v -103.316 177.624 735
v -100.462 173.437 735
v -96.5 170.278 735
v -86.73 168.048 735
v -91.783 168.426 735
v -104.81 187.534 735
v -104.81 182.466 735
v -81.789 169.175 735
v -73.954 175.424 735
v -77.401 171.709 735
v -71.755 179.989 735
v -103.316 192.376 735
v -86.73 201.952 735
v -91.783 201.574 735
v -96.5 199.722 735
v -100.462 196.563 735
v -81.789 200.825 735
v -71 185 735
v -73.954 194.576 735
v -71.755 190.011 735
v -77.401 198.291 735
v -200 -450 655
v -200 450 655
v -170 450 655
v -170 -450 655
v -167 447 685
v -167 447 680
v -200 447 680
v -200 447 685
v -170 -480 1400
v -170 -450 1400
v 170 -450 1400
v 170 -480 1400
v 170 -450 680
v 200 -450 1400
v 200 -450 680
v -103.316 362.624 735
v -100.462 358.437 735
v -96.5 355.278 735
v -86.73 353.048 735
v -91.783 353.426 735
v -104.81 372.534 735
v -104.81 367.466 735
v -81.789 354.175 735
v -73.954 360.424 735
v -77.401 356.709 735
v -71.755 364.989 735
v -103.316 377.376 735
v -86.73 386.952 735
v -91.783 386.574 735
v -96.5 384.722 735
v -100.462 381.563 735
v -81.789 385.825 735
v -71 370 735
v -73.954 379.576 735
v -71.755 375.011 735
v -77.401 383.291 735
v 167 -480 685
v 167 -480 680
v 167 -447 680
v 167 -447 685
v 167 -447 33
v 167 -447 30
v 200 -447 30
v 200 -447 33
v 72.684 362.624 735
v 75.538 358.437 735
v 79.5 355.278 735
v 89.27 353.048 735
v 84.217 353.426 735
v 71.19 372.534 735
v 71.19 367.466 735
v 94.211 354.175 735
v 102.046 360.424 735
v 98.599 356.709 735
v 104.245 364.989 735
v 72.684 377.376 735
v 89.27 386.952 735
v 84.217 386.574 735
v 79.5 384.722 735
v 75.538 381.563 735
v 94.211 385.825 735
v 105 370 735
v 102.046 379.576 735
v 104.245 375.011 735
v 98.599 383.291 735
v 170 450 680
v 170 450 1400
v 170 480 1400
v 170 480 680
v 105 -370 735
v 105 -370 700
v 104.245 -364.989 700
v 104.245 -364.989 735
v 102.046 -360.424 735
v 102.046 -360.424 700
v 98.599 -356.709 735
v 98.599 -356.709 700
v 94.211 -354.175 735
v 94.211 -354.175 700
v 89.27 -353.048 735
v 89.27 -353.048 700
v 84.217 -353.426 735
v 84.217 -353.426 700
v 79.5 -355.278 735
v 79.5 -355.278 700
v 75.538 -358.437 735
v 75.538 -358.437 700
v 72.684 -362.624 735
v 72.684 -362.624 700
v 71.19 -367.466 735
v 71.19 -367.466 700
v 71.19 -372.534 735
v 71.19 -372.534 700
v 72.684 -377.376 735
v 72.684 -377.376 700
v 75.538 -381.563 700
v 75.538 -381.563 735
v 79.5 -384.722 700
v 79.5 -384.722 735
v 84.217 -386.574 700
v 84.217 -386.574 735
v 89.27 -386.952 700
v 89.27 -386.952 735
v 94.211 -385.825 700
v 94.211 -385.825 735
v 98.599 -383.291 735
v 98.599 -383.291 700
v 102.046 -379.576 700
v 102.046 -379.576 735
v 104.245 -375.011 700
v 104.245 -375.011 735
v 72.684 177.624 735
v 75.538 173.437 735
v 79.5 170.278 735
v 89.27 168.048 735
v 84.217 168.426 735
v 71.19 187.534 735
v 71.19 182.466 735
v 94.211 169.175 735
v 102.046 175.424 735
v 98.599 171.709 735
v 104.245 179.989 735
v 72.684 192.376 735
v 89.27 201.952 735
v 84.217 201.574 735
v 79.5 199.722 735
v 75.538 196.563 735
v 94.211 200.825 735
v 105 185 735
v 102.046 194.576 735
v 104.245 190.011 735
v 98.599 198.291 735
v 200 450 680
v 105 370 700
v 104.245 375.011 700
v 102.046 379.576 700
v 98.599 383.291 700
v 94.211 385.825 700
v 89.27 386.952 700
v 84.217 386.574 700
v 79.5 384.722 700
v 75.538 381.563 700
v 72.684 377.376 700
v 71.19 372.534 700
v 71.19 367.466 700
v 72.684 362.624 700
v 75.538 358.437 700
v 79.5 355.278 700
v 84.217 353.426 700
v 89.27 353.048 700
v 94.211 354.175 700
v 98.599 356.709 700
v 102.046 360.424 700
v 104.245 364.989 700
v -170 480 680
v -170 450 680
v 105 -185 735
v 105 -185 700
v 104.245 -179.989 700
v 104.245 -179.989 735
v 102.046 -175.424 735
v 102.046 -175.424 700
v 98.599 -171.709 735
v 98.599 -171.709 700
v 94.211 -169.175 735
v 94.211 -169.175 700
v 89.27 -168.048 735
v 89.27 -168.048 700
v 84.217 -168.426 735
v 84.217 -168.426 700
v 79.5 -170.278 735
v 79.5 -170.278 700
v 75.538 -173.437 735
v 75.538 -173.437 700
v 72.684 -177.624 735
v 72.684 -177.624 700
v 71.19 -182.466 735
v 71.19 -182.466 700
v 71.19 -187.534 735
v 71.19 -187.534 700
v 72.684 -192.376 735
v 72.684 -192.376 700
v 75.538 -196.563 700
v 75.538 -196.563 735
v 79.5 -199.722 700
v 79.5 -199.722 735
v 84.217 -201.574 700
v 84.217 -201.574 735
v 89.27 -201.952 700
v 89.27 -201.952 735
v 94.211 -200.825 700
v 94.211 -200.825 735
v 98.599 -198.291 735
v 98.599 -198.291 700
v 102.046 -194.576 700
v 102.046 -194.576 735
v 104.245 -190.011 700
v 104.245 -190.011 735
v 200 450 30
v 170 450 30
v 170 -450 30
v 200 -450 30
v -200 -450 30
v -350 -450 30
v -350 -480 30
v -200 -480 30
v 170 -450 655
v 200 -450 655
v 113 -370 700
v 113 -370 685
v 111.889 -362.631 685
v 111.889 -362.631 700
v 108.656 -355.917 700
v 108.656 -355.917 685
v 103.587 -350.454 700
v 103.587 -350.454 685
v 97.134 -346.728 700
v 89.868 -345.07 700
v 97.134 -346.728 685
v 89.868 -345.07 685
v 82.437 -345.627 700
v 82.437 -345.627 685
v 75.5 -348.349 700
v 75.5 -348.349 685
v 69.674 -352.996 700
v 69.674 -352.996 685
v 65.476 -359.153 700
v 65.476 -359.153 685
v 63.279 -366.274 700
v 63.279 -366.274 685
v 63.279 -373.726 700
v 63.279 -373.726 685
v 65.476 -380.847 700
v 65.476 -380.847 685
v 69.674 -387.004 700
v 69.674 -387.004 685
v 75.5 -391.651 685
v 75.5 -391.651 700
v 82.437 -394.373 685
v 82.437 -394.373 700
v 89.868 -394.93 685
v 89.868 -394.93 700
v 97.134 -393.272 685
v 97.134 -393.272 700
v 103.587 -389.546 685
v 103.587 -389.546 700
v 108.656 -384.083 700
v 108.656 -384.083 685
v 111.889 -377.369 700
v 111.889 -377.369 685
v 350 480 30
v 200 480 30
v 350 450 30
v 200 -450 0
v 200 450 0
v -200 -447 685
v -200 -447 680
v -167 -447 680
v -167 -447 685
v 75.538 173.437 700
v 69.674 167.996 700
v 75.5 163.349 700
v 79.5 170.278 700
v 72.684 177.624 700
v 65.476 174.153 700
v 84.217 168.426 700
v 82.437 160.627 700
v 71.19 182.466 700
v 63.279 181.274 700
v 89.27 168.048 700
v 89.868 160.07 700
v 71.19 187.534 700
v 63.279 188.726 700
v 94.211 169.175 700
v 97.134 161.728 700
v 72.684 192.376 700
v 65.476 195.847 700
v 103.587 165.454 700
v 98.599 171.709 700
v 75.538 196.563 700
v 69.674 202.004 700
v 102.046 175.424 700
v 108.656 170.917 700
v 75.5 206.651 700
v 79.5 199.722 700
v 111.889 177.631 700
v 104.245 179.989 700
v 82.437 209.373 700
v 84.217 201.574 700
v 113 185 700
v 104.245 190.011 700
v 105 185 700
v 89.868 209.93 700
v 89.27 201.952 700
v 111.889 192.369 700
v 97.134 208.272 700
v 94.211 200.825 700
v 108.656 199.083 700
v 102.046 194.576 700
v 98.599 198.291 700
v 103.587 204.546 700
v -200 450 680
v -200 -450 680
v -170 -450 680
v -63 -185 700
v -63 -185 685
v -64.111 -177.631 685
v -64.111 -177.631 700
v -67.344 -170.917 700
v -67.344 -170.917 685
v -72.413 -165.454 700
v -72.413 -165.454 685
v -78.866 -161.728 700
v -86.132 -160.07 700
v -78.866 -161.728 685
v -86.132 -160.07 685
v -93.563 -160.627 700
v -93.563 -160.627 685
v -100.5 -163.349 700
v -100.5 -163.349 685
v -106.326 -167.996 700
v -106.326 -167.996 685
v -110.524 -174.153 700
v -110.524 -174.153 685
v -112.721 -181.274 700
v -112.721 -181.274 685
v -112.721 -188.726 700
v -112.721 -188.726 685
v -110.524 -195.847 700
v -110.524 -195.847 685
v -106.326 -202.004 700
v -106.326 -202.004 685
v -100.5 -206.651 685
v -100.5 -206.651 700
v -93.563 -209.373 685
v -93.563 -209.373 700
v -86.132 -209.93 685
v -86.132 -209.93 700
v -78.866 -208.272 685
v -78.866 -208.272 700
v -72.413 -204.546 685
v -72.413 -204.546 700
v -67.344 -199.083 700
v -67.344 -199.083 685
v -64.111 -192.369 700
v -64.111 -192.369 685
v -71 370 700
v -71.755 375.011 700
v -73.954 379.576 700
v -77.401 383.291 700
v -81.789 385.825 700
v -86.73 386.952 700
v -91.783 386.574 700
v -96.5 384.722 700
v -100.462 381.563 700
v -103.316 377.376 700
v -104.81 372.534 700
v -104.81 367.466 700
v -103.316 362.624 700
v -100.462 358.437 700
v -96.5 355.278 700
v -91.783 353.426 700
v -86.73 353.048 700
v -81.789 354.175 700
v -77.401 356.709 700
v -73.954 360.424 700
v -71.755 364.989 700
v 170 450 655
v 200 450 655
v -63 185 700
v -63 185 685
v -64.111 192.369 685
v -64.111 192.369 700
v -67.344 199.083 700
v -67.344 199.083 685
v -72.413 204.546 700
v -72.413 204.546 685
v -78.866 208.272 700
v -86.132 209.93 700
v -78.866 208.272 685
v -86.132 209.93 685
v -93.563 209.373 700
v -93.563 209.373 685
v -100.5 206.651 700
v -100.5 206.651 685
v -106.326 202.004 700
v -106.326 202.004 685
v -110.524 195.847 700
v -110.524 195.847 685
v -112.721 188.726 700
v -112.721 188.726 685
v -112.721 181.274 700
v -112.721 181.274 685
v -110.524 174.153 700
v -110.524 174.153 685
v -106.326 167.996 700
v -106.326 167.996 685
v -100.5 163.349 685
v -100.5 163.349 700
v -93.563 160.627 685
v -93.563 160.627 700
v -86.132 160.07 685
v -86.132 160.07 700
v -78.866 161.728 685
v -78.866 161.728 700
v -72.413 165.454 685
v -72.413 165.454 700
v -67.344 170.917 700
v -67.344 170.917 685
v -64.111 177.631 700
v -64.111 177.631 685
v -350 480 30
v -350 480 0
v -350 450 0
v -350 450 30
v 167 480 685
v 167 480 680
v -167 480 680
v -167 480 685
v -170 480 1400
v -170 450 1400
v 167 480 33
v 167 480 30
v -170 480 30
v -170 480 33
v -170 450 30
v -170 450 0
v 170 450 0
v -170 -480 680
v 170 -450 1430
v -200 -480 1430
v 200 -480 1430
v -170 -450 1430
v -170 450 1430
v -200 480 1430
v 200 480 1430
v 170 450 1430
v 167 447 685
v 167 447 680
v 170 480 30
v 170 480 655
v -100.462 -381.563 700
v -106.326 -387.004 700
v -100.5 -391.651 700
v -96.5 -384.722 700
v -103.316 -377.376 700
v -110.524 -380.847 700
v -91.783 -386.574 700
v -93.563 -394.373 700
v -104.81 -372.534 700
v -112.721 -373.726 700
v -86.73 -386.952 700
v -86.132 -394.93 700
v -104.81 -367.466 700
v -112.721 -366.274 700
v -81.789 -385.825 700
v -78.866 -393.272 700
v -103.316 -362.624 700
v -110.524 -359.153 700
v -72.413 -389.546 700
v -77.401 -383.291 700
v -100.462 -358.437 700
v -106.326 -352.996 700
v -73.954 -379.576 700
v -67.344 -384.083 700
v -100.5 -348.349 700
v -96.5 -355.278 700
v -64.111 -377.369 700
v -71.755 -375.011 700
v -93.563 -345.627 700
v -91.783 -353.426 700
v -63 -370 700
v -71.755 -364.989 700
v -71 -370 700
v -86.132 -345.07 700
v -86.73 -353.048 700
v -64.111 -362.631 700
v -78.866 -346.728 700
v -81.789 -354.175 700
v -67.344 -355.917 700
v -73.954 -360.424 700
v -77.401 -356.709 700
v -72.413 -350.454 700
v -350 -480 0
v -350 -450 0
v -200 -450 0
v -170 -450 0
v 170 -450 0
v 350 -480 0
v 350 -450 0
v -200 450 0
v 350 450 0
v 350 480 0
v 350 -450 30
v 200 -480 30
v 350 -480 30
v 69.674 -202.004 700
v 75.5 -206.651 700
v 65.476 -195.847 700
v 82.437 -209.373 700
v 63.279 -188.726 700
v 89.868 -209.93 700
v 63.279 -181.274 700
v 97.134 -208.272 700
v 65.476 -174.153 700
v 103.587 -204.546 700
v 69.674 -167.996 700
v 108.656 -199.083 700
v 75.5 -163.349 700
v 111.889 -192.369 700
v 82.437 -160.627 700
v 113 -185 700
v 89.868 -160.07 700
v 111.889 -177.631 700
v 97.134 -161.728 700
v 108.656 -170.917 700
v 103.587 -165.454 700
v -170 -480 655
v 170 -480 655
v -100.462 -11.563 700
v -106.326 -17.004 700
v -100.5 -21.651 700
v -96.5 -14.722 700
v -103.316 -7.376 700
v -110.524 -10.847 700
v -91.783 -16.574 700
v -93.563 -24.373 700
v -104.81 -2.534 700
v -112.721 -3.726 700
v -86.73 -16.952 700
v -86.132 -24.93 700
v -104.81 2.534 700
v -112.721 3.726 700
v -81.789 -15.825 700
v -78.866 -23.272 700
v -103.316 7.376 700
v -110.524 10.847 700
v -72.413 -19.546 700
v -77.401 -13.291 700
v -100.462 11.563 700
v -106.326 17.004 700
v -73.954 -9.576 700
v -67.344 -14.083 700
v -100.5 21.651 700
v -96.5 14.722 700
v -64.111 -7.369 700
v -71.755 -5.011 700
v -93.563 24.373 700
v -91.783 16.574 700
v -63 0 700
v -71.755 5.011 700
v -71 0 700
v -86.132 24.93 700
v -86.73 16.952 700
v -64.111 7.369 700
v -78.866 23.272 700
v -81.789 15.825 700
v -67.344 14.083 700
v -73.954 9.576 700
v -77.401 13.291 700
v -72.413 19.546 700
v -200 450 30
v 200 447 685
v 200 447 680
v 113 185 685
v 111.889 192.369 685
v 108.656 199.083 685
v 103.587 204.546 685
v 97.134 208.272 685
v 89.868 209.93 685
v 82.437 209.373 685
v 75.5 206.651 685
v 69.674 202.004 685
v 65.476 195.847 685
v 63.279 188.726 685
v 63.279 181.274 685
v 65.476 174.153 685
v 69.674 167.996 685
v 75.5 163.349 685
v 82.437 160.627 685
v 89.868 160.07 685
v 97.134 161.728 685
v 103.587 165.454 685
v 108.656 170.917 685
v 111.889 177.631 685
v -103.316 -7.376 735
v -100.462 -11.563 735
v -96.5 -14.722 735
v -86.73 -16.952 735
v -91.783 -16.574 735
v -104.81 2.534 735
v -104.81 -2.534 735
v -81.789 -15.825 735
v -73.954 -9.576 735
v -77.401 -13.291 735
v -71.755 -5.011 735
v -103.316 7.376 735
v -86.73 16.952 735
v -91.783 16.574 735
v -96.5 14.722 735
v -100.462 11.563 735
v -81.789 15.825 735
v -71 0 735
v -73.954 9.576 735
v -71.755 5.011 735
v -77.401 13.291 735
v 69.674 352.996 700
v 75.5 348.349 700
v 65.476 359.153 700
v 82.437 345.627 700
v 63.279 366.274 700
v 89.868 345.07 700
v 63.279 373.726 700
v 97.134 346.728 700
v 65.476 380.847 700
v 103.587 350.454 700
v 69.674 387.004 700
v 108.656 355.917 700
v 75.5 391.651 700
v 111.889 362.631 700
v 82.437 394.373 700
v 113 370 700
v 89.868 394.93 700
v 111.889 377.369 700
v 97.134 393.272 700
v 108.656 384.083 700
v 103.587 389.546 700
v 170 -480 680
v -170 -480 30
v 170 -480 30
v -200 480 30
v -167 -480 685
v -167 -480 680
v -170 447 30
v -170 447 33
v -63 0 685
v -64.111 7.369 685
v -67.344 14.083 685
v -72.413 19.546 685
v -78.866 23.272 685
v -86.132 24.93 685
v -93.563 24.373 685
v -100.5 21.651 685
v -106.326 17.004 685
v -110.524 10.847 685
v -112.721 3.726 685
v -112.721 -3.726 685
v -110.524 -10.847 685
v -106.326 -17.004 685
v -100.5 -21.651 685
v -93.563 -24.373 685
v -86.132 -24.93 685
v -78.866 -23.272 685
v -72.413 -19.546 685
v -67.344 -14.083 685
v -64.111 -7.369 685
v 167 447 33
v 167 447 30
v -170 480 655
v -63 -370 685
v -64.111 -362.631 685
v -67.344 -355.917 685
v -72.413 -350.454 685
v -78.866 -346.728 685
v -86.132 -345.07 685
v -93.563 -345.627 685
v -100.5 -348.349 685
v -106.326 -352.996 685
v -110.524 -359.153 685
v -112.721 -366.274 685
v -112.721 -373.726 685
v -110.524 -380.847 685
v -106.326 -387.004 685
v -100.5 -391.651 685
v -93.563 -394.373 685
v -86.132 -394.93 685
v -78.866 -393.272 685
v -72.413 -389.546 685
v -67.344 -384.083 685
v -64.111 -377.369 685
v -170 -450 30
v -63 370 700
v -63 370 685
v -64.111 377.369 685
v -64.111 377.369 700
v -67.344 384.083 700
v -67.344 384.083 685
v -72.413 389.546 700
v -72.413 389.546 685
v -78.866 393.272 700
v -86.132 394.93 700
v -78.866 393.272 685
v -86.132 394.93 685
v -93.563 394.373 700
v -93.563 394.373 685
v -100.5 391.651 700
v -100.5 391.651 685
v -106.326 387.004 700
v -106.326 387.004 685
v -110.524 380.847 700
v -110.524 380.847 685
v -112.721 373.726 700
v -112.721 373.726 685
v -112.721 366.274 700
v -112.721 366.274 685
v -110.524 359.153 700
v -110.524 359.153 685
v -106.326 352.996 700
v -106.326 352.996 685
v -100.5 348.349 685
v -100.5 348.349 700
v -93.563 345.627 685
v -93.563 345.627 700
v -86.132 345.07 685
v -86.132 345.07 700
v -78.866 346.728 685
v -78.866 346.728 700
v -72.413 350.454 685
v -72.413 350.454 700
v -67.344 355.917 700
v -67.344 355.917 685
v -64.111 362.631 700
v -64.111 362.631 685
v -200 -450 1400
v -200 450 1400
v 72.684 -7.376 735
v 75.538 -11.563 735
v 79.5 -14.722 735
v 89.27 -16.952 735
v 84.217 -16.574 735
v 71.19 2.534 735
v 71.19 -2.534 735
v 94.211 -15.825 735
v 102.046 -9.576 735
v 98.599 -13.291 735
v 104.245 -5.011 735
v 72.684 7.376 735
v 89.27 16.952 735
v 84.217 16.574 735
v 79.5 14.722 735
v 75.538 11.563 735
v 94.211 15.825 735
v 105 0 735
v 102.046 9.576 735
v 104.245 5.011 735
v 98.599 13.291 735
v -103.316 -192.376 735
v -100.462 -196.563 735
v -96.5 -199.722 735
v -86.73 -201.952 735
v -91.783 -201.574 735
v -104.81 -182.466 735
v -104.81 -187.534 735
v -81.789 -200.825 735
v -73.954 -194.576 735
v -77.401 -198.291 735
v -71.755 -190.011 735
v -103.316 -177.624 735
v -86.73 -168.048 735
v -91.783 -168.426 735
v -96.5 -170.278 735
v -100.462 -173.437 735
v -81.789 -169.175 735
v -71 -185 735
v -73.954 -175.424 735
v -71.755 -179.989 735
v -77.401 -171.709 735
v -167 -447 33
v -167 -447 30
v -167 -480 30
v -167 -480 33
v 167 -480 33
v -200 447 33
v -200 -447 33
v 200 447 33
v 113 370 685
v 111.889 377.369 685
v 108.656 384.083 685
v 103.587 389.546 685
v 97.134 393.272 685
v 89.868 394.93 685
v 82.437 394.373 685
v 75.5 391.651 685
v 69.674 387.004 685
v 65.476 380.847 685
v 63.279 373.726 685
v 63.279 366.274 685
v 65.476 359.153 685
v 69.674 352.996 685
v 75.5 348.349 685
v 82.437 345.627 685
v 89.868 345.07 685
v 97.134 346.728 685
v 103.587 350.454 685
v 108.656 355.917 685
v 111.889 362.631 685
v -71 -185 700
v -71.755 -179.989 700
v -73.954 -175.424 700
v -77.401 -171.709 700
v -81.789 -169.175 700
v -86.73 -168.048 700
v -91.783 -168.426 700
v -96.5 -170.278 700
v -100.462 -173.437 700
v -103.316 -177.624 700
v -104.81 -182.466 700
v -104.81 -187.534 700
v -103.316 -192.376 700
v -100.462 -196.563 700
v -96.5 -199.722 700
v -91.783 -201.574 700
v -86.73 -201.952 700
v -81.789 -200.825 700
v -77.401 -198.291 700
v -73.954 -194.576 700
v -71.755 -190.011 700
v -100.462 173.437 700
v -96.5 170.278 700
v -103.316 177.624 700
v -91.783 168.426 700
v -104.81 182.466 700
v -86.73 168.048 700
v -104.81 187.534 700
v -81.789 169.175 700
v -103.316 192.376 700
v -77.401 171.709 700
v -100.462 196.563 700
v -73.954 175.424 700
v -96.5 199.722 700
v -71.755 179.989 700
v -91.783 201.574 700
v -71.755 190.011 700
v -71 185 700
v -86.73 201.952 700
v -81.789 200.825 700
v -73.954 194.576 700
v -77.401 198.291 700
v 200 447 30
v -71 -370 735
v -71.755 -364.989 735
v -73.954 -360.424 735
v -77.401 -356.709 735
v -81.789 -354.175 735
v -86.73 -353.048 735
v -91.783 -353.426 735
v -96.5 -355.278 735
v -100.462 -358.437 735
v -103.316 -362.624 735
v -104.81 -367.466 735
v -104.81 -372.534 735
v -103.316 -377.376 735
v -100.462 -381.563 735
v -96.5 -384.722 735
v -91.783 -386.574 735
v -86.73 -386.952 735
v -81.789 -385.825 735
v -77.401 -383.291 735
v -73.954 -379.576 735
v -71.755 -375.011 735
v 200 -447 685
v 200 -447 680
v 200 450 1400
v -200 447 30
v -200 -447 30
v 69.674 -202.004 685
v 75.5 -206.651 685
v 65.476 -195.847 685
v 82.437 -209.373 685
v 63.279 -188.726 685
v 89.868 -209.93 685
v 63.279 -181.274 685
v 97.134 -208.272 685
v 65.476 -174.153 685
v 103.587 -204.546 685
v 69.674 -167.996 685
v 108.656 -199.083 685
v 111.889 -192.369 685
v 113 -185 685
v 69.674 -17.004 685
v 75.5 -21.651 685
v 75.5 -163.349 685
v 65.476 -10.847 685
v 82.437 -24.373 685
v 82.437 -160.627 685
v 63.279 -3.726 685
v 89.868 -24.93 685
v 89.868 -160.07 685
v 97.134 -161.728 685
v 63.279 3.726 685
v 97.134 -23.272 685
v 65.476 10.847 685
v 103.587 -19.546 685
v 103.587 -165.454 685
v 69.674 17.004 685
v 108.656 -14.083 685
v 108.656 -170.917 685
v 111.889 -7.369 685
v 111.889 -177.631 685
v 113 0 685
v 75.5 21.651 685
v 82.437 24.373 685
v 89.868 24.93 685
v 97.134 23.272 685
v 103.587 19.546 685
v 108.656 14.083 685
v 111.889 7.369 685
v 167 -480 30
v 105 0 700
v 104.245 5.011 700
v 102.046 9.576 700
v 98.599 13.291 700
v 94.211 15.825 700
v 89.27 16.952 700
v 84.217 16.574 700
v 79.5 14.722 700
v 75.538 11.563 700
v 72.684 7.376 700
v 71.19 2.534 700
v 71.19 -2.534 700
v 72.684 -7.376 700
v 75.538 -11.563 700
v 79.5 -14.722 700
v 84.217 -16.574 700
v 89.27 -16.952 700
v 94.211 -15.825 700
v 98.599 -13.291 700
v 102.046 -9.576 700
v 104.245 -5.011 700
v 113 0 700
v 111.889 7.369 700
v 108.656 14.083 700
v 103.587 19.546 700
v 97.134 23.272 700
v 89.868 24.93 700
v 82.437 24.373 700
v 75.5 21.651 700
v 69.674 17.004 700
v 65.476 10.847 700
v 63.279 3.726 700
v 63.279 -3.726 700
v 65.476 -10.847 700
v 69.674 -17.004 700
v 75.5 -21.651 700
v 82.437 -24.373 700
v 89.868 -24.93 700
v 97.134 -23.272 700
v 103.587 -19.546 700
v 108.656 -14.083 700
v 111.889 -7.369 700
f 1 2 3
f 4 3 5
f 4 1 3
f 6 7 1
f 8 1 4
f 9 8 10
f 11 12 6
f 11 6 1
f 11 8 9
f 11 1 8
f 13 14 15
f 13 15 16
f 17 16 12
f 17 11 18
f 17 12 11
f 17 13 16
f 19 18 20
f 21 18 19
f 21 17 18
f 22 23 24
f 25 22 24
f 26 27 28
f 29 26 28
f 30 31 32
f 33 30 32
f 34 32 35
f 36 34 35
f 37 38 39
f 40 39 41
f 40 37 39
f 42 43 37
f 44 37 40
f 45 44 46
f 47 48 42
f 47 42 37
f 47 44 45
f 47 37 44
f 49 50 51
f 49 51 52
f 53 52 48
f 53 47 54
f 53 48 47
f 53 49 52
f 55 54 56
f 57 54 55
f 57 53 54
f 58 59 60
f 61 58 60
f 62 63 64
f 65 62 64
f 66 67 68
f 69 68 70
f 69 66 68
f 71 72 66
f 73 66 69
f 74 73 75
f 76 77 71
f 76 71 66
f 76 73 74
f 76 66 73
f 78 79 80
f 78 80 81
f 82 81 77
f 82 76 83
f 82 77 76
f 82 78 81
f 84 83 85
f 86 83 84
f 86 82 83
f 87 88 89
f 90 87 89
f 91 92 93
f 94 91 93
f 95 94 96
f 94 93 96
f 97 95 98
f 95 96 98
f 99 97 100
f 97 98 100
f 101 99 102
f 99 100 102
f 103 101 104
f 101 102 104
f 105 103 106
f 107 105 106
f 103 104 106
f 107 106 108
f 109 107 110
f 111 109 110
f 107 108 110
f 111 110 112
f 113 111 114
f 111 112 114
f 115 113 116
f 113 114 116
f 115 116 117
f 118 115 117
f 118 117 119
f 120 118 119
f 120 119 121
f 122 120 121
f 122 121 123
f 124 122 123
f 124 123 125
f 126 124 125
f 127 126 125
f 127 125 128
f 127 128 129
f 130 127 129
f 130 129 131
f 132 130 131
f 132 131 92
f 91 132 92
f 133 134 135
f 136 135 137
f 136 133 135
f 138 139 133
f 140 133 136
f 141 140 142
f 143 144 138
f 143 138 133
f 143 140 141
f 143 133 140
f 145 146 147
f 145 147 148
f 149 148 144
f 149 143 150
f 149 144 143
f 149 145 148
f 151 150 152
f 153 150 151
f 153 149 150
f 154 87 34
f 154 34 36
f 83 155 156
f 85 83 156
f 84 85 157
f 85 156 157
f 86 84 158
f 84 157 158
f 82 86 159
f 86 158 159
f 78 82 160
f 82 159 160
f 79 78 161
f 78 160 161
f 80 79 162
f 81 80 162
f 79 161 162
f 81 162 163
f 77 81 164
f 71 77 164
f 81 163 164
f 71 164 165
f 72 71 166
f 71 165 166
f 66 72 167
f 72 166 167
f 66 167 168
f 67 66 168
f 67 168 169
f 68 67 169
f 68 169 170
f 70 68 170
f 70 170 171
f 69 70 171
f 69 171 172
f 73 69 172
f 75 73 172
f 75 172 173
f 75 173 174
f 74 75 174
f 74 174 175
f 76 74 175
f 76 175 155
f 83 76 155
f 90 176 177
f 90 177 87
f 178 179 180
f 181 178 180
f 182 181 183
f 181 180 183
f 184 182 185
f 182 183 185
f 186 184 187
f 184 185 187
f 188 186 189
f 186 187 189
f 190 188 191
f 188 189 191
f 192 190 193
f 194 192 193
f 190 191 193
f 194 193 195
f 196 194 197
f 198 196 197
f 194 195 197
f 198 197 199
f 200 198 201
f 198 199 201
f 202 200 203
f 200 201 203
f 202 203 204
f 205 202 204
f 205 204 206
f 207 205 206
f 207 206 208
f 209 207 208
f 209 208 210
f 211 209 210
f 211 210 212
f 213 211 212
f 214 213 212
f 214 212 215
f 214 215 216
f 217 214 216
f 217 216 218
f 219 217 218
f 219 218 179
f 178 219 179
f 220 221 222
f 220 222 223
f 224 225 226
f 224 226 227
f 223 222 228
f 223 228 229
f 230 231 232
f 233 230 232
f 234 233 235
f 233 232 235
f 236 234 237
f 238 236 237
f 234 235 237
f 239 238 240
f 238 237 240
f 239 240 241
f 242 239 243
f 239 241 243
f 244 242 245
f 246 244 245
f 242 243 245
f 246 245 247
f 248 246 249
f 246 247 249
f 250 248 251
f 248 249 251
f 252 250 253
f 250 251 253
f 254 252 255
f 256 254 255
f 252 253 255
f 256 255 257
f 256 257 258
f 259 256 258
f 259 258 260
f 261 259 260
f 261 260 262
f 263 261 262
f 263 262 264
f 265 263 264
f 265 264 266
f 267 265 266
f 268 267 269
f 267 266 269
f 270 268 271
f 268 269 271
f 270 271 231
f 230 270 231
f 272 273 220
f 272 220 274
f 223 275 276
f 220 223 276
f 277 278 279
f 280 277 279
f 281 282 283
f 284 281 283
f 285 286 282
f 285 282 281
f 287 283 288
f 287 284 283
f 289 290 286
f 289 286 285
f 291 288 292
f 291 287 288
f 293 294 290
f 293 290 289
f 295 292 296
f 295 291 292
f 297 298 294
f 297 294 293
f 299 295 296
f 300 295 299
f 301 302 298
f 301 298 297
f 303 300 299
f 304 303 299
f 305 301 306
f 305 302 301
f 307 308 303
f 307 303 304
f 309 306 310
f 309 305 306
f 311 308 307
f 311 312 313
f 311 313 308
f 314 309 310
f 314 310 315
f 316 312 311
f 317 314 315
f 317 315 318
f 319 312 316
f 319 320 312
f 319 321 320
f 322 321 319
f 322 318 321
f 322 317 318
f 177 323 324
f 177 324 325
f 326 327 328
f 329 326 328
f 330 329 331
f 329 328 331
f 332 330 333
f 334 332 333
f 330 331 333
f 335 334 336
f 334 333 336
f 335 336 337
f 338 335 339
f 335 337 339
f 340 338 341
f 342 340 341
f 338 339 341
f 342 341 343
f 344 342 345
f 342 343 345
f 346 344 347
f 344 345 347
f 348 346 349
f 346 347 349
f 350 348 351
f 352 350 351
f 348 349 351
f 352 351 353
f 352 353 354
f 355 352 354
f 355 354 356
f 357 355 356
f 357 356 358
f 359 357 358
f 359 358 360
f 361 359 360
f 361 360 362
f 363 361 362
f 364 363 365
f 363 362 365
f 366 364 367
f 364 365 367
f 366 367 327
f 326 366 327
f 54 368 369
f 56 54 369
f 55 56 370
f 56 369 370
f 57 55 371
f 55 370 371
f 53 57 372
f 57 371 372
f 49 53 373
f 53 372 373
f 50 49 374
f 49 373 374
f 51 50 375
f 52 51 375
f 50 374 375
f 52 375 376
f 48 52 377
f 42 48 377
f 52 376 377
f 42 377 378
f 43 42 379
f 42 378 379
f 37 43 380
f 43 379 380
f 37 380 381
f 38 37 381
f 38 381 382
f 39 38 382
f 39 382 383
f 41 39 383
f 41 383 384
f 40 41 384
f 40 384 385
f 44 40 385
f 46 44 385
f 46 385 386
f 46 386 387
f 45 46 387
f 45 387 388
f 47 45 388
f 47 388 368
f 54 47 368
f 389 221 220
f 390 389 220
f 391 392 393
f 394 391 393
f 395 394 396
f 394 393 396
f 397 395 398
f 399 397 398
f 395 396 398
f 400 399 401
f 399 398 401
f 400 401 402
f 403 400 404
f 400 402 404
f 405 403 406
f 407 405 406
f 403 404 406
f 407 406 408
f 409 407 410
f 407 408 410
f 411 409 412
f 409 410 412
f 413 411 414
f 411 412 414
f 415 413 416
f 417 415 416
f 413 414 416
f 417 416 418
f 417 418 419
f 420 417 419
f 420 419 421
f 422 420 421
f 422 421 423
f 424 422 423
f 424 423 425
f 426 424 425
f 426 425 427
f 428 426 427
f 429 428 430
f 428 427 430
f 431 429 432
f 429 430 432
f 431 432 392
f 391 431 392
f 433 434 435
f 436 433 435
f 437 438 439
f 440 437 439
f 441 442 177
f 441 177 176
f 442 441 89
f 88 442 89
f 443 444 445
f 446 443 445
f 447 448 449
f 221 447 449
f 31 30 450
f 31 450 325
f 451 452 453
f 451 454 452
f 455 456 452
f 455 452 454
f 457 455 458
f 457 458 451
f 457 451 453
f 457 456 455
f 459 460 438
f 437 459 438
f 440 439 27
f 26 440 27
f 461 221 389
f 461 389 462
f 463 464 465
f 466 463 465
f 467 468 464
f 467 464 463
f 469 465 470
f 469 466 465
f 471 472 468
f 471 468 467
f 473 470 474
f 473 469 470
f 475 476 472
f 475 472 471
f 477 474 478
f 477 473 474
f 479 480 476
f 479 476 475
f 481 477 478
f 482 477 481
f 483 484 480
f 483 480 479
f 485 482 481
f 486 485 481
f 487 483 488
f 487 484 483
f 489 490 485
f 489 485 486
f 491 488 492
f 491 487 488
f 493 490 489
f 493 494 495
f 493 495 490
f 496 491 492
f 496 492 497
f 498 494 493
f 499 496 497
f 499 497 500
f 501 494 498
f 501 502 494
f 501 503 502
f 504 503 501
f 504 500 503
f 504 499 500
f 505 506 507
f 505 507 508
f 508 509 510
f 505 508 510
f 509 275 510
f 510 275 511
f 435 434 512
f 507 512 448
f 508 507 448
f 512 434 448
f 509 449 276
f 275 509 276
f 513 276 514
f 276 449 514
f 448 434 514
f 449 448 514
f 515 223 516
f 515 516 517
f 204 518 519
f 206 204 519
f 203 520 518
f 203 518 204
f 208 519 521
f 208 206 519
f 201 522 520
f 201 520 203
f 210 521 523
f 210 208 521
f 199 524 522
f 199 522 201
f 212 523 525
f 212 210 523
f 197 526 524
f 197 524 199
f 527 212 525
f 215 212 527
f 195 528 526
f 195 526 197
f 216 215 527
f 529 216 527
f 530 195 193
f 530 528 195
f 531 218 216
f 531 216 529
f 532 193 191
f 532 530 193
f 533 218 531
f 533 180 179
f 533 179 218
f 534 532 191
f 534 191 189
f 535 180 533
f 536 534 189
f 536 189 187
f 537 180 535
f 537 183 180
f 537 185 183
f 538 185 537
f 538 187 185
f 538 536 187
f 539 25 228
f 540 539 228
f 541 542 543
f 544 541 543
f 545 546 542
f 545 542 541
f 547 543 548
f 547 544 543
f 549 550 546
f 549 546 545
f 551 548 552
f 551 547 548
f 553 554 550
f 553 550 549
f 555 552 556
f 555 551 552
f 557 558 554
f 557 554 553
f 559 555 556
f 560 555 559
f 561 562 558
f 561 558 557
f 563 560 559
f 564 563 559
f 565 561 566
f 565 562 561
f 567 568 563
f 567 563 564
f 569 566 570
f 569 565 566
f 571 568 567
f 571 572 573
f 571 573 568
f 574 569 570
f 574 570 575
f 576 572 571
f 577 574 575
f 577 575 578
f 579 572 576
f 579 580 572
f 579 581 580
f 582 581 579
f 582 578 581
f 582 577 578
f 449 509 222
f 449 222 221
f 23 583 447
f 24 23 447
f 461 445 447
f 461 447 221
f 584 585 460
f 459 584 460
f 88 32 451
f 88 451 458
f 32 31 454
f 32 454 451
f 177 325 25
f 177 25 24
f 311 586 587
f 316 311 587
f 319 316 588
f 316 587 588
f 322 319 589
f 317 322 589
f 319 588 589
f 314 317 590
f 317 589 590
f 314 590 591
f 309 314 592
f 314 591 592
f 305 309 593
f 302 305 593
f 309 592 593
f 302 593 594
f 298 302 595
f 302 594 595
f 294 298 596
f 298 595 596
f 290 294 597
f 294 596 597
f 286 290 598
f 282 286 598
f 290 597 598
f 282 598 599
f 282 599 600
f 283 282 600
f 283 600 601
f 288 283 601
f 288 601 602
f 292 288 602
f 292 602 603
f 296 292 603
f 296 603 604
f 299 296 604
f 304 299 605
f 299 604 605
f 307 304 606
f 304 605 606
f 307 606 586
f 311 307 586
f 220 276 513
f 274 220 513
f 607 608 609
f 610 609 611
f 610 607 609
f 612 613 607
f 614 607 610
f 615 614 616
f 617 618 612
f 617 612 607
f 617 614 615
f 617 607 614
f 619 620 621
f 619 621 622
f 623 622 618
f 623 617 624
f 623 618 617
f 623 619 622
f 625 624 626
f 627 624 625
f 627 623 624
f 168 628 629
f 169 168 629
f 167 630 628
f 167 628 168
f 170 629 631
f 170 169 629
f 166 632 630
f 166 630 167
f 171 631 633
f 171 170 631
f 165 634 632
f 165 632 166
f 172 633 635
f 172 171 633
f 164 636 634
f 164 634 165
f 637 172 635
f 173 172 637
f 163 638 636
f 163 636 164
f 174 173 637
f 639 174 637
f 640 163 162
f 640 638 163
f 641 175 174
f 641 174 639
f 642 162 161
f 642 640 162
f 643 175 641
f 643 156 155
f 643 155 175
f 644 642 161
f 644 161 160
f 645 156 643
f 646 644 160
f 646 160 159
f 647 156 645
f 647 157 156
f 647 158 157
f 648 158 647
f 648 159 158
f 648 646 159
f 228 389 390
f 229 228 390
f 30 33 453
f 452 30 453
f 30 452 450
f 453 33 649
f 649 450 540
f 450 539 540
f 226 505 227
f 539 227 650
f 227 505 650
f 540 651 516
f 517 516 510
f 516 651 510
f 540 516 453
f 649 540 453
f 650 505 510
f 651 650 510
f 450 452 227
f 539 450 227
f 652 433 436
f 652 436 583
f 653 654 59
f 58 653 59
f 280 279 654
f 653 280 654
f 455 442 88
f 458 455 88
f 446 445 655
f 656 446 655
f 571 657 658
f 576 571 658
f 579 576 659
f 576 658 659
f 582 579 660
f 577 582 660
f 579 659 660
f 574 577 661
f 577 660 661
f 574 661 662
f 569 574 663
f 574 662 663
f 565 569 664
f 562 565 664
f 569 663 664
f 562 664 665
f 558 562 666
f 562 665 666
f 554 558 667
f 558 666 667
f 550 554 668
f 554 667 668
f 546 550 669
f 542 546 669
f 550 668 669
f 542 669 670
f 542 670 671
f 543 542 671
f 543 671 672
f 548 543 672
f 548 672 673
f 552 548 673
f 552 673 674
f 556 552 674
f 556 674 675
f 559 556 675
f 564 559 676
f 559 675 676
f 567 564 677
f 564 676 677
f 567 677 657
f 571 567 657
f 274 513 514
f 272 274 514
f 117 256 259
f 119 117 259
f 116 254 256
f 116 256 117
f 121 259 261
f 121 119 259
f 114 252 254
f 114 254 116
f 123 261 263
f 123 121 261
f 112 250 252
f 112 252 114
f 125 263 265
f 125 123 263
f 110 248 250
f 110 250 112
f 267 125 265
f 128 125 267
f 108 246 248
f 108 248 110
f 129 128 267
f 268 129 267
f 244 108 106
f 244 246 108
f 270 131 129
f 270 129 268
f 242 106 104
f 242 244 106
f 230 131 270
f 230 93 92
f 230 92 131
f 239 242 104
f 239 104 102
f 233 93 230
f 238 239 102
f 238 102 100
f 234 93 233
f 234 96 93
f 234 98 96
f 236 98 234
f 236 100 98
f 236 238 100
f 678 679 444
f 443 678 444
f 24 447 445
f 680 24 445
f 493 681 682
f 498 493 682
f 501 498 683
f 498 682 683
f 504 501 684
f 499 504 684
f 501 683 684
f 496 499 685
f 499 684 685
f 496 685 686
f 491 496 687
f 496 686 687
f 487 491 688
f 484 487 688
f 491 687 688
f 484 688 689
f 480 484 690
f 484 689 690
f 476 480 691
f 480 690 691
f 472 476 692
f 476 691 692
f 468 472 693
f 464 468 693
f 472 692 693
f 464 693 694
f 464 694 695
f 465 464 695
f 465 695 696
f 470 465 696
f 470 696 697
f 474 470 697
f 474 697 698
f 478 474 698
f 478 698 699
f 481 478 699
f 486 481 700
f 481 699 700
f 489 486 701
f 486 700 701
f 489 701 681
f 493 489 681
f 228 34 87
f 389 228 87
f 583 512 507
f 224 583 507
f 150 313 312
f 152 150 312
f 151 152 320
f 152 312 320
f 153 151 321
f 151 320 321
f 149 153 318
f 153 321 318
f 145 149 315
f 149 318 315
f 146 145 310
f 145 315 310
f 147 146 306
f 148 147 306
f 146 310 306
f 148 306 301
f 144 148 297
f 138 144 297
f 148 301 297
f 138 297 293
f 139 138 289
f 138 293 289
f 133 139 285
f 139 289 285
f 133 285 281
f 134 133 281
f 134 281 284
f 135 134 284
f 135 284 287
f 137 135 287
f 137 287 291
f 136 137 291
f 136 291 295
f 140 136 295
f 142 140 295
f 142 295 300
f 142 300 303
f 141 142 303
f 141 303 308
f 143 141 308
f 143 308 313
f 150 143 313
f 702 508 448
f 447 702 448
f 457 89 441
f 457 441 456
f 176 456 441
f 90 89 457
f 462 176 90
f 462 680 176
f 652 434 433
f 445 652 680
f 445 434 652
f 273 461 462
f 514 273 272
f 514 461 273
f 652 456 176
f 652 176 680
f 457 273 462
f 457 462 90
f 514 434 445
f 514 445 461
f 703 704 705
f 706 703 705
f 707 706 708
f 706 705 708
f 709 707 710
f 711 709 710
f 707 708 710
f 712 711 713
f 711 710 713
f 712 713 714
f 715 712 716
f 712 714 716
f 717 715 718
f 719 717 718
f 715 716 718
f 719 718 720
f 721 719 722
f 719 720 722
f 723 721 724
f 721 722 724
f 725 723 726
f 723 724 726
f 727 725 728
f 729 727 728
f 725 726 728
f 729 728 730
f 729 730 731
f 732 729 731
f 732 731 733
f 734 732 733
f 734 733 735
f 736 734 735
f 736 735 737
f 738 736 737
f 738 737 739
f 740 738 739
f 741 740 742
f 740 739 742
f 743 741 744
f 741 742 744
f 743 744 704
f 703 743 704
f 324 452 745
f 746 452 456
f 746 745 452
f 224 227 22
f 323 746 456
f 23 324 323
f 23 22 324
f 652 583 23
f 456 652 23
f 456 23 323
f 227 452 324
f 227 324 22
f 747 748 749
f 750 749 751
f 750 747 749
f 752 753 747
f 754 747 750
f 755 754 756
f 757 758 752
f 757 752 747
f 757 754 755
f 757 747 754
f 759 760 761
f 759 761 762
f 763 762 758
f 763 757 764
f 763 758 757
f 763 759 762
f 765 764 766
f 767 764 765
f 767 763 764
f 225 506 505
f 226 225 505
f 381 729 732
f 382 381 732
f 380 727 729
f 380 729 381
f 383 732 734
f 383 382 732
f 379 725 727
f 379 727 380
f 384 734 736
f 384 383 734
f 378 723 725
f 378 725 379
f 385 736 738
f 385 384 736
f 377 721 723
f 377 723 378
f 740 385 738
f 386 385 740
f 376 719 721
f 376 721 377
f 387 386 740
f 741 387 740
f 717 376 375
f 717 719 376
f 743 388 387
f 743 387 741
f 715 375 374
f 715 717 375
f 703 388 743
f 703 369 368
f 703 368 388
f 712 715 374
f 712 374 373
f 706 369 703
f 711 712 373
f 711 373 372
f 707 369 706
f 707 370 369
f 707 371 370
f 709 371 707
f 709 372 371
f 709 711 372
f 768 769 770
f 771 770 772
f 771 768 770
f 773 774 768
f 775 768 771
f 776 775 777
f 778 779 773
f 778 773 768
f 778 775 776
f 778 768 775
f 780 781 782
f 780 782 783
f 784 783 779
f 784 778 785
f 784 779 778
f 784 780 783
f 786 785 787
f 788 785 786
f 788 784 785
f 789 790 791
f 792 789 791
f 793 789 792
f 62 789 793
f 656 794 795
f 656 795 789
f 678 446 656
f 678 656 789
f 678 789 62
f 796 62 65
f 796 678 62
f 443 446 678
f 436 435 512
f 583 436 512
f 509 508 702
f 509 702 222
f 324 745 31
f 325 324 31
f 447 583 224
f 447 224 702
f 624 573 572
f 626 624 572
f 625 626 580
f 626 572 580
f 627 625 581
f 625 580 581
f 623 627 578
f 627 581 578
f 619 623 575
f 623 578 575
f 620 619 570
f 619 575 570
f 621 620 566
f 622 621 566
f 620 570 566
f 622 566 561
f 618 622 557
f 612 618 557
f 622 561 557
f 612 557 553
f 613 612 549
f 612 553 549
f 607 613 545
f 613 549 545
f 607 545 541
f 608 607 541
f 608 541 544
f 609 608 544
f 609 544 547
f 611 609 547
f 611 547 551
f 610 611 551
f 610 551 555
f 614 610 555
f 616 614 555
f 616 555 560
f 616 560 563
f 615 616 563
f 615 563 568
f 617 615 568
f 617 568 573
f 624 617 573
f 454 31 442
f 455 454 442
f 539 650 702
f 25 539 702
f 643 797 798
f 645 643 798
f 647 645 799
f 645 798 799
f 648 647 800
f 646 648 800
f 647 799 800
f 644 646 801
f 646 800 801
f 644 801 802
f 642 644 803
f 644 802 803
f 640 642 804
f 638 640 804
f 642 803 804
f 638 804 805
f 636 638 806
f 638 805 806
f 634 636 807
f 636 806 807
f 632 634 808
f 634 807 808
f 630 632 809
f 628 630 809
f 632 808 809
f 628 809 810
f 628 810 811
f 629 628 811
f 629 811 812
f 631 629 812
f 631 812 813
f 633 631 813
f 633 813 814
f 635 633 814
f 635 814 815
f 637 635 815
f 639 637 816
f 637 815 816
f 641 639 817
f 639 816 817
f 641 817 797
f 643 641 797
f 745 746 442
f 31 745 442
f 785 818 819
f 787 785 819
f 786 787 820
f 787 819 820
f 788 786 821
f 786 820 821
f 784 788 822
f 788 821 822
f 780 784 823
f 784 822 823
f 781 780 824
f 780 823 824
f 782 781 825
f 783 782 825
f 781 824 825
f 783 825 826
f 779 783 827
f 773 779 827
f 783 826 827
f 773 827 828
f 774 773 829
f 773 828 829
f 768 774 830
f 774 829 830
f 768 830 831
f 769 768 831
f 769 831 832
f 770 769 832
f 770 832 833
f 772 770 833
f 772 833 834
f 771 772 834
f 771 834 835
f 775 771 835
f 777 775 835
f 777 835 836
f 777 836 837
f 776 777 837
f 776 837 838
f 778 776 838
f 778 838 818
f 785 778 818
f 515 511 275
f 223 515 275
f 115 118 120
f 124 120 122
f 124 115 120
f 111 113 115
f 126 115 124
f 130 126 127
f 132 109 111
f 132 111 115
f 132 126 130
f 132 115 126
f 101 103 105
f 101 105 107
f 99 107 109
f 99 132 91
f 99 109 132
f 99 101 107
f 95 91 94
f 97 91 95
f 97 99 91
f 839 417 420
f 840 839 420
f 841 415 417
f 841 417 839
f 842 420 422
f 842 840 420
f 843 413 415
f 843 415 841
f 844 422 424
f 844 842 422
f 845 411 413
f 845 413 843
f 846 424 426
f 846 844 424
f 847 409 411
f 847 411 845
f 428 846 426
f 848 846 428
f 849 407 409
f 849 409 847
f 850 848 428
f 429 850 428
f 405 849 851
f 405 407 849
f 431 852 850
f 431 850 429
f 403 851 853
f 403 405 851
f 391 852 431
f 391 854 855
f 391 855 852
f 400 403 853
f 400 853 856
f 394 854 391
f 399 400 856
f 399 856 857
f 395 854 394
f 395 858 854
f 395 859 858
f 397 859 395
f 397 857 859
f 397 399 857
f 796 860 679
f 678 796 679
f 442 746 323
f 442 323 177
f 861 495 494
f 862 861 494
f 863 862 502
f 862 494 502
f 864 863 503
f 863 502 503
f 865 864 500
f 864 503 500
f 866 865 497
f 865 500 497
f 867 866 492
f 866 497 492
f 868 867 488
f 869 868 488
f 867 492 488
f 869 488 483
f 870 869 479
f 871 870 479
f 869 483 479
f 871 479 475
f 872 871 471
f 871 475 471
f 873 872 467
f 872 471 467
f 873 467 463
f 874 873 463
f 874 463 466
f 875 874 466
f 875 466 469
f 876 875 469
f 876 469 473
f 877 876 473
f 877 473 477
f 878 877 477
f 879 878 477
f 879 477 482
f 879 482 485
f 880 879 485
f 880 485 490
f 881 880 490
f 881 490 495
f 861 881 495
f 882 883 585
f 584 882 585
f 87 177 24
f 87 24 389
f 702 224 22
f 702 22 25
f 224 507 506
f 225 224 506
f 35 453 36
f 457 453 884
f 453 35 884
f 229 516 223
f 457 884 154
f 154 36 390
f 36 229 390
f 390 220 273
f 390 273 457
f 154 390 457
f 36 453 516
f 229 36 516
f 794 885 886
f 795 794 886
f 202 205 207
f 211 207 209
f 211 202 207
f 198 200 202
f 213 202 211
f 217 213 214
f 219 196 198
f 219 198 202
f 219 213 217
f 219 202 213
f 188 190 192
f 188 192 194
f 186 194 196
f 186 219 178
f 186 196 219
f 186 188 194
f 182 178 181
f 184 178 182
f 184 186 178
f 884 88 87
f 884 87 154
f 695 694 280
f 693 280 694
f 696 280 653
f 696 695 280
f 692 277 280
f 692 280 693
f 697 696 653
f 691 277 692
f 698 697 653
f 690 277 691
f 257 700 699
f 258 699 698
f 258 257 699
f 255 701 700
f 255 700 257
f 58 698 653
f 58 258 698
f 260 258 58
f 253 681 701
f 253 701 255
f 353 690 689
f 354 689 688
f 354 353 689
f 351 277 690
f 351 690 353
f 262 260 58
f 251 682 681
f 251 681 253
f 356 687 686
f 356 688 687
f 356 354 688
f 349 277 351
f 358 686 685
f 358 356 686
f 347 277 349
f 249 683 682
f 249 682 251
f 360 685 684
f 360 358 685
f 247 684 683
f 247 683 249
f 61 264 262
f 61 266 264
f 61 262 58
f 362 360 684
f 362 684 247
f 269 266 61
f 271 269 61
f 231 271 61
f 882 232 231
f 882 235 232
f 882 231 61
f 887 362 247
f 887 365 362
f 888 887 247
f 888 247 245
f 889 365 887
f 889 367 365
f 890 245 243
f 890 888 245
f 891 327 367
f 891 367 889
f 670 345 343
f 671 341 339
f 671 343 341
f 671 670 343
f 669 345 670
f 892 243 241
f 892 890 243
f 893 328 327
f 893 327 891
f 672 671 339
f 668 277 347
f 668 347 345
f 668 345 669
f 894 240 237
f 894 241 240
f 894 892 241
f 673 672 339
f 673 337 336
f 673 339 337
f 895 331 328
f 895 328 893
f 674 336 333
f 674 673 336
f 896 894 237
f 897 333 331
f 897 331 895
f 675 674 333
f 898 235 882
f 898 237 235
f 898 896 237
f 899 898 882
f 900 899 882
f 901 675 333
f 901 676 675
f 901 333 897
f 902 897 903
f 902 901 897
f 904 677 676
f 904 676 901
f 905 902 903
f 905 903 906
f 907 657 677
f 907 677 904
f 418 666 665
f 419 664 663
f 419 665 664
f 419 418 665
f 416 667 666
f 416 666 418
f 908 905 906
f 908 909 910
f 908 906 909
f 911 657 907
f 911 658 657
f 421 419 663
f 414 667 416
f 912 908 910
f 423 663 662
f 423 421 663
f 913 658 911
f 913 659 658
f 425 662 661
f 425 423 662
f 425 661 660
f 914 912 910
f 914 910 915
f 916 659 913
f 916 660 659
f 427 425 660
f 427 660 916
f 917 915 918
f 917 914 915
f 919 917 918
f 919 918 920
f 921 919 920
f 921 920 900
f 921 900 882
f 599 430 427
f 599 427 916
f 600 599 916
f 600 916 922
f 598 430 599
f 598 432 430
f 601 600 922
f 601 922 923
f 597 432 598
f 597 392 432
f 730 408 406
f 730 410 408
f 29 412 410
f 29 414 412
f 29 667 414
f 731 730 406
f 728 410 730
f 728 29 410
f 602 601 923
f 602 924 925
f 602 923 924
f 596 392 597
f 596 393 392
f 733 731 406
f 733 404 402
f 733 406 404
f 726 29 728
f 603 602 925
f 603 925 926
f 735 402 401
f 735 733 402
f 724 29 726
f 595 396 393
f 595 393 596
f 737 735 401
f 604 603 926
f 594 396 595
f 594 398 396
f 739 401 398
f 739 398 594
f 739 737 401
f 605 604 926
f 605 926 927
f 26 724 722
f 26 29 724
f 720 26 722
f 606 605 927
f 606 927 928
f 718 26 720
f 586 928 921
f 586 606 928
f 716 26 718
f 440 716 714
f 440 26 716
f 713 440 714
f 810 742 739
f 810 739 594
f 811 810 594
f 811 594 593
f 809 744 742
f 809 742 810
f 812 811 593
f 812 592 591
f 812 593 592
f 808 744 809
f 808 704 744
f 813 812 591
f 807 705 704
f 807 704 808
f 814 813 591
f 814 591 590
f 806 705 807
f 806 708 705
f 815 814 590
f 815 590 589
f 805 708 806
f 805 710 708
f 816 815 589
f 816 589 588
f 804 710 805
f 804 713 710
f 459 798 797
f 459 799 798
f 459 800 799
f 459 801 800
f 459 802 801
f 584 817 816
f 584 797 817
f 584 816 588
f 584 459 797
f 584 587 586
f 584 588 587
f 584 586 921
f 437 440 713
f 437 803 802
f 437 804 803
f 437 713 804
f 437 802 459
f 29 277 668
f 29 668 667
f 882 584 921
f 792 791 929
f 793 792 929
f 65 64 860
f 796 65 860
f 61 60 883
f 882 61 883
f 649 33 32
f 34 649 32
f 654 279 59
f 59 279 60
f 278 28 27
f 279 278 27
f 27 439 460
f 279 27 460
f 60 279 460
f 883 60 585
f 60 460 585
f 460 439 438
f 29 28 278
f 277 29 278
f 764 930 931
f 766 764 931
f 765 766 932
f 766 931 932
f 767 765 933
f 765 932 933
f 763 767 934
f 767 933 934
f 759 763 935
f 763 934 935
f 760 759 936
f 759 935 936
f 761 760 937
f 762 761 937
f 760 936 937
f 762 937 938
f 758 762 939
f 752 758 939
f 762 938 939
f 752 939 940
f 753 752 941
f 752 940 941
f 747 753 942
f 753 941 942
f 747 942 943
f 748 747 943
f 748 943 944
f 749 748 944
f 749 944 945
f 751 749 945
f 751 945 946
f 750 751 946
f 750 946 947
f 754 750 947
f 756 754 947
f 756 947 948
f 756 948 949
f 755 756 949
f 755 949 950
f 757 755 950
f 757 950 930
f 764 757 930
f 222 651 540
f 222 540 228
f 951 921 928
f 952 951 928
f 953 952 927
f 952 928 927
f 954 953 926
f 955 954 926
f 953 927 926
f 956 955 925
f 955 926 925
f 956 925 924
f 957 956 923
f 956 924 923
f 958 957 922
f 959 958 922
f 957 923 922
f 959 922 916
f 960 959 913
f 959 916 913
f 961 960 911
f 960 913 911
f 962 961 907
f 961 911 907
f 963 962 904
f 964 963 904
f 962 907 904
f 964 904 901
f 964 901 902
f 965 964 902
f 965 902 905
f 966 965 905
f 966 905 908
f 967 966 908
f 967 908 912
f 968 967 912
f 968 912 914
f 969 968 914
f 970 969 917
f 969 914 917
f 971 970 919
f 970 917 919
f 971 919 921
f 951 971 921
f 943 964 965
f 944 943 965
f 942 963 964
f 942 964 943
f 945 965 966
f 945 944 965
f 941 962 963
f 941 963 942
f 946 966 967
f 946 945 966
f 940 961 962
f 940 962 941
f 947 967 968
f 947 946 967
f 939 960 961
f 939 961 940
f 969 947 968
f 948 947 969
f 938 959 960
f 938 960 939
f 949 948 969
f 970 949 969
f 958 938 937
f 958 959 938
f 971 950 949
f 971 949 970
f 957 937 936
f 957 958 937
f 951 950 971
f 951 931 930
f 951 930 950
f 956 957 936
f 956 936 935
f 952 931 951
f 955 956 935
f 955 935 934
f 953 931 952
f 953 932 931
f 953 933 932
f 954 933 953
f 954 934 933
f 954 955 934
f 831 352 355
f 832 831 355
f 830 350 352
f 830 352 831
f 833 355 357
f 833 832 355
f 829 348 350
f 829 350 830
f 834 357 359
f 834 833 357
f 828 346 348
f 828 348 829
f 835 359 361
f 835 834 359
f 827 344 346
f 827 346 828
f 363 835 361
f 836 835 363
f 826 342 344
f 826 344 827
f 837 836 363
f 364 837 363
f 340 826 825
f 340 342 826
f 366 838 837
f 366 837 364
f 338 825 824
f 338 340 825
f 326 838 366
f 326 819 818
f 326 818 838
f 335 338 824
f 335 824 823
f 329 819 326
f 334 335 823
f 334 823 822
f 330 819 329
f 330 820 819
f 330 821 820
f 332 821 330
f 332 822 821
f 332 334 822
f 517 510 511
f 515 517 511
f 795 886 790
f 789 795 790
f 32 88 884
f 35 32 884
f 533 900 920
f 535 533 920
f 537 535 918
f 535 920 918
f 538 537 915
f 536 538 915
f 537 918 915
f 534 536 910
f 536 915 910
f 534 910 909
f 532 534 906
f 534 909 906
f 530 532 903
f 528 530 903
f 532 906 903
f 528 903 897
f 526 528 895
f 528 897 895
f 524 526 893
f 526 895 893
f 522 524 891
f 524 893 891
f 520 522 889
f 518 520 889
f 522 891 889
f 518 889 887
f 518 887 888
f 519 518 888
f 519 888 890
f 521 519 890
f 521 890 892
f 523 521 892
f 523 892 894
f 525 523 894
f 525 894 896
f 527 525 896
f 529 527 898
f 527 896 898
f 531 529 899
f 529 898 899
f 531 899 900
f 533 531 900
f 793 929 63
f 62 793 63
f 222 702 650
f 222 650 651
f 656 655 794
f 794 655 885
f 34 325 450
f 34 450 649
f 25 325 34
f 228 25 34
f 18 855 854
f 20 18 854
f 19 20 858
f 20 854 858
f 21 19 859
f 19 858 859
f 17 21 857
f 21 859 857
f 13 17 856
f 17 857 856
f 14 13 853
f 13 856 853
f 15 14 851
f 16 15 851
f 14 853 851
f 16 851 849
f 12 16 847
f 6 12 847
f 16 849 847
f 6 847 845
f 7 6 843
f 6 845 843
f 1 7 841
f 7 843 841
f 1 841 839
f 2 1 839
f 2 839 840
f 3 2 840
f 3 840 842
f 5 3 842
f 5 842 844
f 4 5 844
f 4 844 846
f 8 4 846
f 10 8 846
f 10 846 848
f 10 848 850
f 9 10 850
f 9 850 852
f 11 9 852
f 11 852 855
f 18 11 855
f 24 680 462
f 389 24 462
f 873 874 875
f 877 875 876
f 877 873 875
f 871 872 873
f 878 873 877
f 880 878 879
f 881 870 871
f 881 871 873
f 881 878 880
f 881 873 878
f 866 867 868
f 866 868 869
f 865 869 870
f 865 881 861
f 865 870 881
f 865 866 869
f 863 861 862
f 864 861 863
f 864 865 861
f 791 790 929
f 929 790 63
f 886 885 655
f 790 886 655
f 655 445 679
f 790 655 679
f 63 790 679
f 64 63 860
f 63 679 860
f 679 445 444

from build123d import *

# Parameters (mm, degrees)
F0_W      = 30
F0_H      = 30
F1_DEPTH  = 1400
F2_W      = 340
F2_H      = 900
F3_DEPTH  = 30
F5_W      = 400
F5_H      = 960
F5_W_2    = 340
F5_H_2    = 900
F6_DEPTH  = 25
F8_W      = 400
F8_H      = 960
F8_W_2    = 340
F8_H_2    = 900
F9_DEPTH  = 30
F11_DEPTH = 5
F12_R     = 17
F13_DEPTH = 50
F14_R     = 25
F14_R_2   = 17
F15_DEPTH = 15
F17_DEPTH = 3


with BuildPart() as f1:
    # F0 (on Top) → F1 (new body)
    with BuildSketch(Plane.XY):
        with Locations((185, 465)):
            Rectangle(F0_W, F0_H)
        with Locations((185, -465)):
            Rectangle(F0_W, F0_H)
        with Locations((-185, 465)):
            Rectangle(F0_W, F0_H)
        with Locations((-185, -465)):
            Rectangle(F0_W, F0_H)
    extrude(amount=F1_DEPTH)

    # F2 (on Top) → F3 (join)
    with BuildSketch(Plane.XY):
        Polygon((350, 480), (200, 480), (-200, 480), (-350, 480), (-350, 450), (-200, 450), (-200, -450), (-350, -450), (-350, -480), (-200, -480), (200, -480), (350, -480), (350, -450), (200, -450), (200, 450), (350, 450), align=None)
        Rectangle(F2_W, F2_H, mode=Mode.SUBTRACT)
    extrude(amount=F3_DEPTH)

    # F5 (on offset) → F6 (join)
    with BuildSketch(Plane.XY.offset(680)):
        Rectangle(F5_W, F5_H)
        Rectangle(F5_W_2, F5_H_2, mode=Mode.SUBTRACT)
    extrude(amount=-F6_DEPTH)

    # F8 (on offset) → F9 (join)
    with BuildSketch(Plane.XY.offset(1400)):
        Rectangle(F8_W, F8_H)
        Rectangle(F8_W_2, F8_H_2, mode=Mode.SUBTRACT)
    extrude(amount=F9_DEPTH)


with BuildPart() as f11:
    # F10 (on offset) → F11 (new body)
    with BuildSketch(Plane.XY.offset(680)):
        Polygon((-200, 447), (-200, 0), (-200, -447), (-167, -447), (-167, -480), (167, -480), (167, -447), (200, -447), (200, 447), (167, 447), (167, 480), (-167, 480), (-167, 447), align=None)
    extrude(amount=F11_DEPTH)

    # F12 (on face) → F13 (join)
    with BuildSketch(Plane.XY.offset(685)):
        with Locations((-88, -185)):
            Circle(F12_R)
        with Locations((-88, -370)):
            Circle(F12_R)
        with Locations((88, -185)):
            Circle(F12_R)
        with Locations((88, -370)):
            Circle(F12_R)
        with Locations((88, 0)):
            Circle(F12_R)
        with Locations((-88, 0)):
            Circle(F12_R)
        with Locations((-88, 185)):
            Circle(F12_R)
        with Locations((88, 185)):
            Circle(F12_R)
        with Locations((88, 370)):
            Circle(F12_R)
        with Locations((-88, 370)):
            Circle(F12_R)
    extrude(amount=F13_DEPTH)

    # F14 (on face) → F15 (join)
    with BuildSketch(Plane.XY.offset(685)):
        with Locations((88, -370)):
            Circle(F14_R)
        with Locations((88, -370)):
            Circle(F14_R_2, mode=Mode.SUBTRACT)
        with Locations((-88, -370)):
            Circle(F14_R)
        with Locations((-88, -370)):
            Circle(F14_R_2, mode=Mode.SUBTRACT)
        with Locations((-88, -185)):
            Circle(F14_R)
        with Locations((-88, -185)):
            Circle(F14_R_2, mode=Mode.SUBTRACT)
        with Locations((88, -185)):
            Circle(F14_R)
        with Locations((88, -185)):
            Circle(F14_R_2, mode=Mode.SUBTRACT)
        with Locations((-88, 0)):
            Circle(F14_R)
        with Locations((-88, 0)):
            Circle(F14_R_2, mode=Mode.SUBTRACT)
        with Locations((88, 0)):
            Circle(F14_R)
        with Locations((88, 0)):
            Circle(F14_R_2, mode=Mode.SUBTRACT)
        with Locations((88, 185)):
            Circle(F14_R)
        with Locations((88, 185)):
            Circle(F14_R_2, mode=Mode.SUBTRACT)
        with Locations((-88, 185)):
            Circle(F14_R)
        with Locations((-88, 185)):
            Circle(F14_R_2, mode=Mode.SUBTRACT)
        with Locations((-88, 370)):
            Circle(F14_R)
        with Locations((-88, 370)):
            Circle(F14_R_2, mode=Mode.SUBTRACT)
        with Locations((88, 370)):
            Circle(F14_R)
        with Locations((88, 370)):
            Circle(F14_R_2, mode=Mode.SUBTRACT)
    extrude(amount=F15_DEPTH)


with BuildPart() as f17:
    # F16 (on face) → F17 (new body)
    with BuildSketch(Plane.XY.offset(30)):
        Polygon((-200, 447), (-200, 43.747727), (-200, -447), (-167, -447), (-167, -480), (167, -480), (167, -447), (200, -447), (200, 447), (167, 447), (167, 480), (-170, 480), (-170, 447), align=None)
    extrude(amount=F17_DEPTH)


solid = Compound([f1.part, f11.part, f17.part])
